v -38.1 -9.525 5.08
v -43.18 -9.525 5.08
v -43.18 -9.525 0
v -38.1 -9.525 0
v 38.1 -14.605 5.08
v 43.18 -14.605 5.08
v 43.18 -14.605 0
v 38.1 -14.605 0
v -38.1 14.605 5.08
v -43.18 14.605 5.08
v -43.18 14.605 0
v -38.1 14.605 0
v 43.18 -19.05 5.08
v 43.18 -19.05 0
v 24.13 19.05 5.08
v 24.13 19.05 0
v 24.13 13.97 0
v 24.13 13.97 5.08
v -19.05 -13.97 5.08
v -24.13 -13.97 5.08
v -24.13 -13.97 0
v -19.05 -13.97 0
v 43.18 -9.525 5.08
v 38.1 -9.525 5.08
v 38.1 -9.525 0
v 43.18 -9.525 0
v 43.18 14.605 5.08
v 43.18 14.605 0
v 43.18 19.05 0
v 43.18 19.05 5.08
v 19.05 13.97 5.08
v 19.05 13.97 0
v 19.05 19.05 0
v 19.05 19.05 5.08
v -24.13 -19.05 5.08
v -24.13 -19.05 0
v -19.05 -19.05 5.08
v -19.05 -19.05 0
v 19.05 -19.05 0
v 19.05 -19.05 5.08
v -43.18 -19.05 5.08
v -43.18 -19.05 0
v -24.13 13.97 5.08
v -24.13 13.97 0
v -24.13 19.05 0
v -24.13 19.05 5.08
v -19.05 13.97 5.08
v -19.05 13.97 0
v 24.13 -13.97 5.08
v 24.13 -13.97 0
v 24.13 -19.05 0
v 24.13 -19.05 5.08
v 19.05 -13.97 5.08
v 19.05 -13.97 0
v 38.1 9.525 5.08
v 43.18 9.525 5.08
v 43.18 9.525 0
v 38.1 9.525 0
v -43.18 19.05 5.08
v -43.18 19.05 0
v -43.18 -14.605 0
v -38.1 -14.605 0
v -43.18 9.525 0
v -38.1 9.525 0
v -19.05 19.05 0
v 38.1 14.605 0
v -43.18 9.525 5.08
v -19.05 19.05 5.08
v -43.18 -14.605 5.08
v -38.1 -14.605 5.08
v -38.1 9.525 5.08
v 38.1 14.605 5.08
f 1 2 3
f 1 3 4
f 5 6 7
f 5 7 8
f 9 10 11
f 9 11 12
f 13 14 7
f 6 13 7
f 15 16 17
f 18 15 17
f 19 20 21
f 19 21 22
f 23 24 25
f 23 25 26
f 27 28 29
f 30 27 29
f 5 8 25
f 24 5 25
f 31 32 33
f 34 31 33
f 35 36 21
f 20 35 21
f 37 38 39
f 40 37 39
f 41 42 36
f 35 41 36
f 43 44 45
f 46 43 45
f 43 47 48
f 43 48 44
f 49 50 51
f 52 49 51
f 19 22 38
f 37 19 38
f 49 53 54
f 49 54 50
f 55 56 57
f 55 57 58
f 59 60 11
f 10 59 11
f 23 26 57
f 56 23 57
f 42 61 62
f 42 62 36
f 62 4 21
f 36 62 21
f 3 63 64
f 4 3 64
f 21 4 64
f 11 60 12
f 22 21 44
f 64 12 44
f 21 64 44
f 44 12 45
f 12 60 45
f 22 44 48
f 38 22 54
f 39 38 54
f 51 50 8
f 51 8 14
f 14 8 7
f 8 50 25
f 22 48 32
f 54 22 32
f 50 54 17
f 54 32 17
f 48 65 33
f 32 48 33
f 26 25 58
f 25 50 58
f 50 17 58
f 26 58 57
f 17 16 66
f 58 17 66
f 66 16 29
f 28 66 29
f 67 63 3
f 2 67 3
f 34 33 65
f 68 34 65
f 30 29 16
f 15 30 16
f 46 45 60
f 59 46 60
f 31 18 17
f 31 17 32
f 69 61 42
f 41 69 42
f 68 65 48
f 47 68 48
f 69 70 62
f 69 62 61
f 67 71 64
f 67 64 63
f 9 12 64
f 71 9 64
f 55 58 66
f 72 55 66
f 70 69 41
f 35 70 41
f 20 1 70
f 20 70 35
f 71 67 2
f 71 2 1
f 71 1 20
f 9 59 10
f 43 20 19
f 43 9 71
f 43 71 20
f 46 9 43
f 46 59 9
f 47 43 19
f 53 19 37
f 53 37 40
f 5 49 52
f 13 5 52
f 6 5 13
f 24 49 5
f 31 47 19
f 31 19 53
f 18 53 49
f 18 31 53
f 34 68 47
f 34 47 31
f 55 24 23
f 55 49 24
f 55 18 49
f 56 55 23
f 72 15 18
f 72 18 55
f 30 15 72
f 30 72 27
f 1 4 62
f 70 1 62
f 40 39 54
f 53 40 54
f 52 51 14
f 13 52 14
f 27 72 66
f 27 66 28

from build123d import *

# Parameters (mm, degrees)
F1_DEPTH = 5.08


# Not quite as in the source:
# - a feature names something its author has since deleted; it is built from what else it names


with BuildPart() as f1:
    # F0 (on Top) → F1 (new body)
    with BuildSketch(Plane.XY):
        Polygon((-43.18, 9.525), (-43.18, 0), (0, 0), (0, 19.05), (-19.05, 19.05), (-19.05, 13.97), (-24.13, 13.97), (-24.13, 19.05), (-38.1, 19.05), (-43.18, 19.05), (-43.18, 14.605), (-38.1, 14.605), (-38.1, 9.525), align=None)
        Polygon((-43.18, -14.605), (-43.18, -19.05), (-24.13, -19.05), (-24.13, -13.97), (-19.05, -13.97), (-19.05, -19.05), (19.05, -19.05), (19.05, -13.97), (24.13, -13.97), (24.13, -19.05), (43.18, -19.05), (43.18, -14.605), (38.1, -14.605), (38.1, -9.525), (43.18, -9.525), (43.18, 0), (0, 0), (-43.18, 0), (-43.18, -9.525), (-38.1, -9.525), (-38.1, -14.605), align=None)
        Polygon((0, 19.05), (0, 0), (43.18, 0), (43.18, 9.525), (38.1, 9.525), (38.1, 14.605), (43.18, 14.605), (43.18, 19.05), (38.1, 19.05), (24.13, 19.05), (24.13, 13.97), (19.05, 13.97), (19.05, 19.05), align=None)
    extrude(amount=F1_DEPTH)


solid = f1.part
